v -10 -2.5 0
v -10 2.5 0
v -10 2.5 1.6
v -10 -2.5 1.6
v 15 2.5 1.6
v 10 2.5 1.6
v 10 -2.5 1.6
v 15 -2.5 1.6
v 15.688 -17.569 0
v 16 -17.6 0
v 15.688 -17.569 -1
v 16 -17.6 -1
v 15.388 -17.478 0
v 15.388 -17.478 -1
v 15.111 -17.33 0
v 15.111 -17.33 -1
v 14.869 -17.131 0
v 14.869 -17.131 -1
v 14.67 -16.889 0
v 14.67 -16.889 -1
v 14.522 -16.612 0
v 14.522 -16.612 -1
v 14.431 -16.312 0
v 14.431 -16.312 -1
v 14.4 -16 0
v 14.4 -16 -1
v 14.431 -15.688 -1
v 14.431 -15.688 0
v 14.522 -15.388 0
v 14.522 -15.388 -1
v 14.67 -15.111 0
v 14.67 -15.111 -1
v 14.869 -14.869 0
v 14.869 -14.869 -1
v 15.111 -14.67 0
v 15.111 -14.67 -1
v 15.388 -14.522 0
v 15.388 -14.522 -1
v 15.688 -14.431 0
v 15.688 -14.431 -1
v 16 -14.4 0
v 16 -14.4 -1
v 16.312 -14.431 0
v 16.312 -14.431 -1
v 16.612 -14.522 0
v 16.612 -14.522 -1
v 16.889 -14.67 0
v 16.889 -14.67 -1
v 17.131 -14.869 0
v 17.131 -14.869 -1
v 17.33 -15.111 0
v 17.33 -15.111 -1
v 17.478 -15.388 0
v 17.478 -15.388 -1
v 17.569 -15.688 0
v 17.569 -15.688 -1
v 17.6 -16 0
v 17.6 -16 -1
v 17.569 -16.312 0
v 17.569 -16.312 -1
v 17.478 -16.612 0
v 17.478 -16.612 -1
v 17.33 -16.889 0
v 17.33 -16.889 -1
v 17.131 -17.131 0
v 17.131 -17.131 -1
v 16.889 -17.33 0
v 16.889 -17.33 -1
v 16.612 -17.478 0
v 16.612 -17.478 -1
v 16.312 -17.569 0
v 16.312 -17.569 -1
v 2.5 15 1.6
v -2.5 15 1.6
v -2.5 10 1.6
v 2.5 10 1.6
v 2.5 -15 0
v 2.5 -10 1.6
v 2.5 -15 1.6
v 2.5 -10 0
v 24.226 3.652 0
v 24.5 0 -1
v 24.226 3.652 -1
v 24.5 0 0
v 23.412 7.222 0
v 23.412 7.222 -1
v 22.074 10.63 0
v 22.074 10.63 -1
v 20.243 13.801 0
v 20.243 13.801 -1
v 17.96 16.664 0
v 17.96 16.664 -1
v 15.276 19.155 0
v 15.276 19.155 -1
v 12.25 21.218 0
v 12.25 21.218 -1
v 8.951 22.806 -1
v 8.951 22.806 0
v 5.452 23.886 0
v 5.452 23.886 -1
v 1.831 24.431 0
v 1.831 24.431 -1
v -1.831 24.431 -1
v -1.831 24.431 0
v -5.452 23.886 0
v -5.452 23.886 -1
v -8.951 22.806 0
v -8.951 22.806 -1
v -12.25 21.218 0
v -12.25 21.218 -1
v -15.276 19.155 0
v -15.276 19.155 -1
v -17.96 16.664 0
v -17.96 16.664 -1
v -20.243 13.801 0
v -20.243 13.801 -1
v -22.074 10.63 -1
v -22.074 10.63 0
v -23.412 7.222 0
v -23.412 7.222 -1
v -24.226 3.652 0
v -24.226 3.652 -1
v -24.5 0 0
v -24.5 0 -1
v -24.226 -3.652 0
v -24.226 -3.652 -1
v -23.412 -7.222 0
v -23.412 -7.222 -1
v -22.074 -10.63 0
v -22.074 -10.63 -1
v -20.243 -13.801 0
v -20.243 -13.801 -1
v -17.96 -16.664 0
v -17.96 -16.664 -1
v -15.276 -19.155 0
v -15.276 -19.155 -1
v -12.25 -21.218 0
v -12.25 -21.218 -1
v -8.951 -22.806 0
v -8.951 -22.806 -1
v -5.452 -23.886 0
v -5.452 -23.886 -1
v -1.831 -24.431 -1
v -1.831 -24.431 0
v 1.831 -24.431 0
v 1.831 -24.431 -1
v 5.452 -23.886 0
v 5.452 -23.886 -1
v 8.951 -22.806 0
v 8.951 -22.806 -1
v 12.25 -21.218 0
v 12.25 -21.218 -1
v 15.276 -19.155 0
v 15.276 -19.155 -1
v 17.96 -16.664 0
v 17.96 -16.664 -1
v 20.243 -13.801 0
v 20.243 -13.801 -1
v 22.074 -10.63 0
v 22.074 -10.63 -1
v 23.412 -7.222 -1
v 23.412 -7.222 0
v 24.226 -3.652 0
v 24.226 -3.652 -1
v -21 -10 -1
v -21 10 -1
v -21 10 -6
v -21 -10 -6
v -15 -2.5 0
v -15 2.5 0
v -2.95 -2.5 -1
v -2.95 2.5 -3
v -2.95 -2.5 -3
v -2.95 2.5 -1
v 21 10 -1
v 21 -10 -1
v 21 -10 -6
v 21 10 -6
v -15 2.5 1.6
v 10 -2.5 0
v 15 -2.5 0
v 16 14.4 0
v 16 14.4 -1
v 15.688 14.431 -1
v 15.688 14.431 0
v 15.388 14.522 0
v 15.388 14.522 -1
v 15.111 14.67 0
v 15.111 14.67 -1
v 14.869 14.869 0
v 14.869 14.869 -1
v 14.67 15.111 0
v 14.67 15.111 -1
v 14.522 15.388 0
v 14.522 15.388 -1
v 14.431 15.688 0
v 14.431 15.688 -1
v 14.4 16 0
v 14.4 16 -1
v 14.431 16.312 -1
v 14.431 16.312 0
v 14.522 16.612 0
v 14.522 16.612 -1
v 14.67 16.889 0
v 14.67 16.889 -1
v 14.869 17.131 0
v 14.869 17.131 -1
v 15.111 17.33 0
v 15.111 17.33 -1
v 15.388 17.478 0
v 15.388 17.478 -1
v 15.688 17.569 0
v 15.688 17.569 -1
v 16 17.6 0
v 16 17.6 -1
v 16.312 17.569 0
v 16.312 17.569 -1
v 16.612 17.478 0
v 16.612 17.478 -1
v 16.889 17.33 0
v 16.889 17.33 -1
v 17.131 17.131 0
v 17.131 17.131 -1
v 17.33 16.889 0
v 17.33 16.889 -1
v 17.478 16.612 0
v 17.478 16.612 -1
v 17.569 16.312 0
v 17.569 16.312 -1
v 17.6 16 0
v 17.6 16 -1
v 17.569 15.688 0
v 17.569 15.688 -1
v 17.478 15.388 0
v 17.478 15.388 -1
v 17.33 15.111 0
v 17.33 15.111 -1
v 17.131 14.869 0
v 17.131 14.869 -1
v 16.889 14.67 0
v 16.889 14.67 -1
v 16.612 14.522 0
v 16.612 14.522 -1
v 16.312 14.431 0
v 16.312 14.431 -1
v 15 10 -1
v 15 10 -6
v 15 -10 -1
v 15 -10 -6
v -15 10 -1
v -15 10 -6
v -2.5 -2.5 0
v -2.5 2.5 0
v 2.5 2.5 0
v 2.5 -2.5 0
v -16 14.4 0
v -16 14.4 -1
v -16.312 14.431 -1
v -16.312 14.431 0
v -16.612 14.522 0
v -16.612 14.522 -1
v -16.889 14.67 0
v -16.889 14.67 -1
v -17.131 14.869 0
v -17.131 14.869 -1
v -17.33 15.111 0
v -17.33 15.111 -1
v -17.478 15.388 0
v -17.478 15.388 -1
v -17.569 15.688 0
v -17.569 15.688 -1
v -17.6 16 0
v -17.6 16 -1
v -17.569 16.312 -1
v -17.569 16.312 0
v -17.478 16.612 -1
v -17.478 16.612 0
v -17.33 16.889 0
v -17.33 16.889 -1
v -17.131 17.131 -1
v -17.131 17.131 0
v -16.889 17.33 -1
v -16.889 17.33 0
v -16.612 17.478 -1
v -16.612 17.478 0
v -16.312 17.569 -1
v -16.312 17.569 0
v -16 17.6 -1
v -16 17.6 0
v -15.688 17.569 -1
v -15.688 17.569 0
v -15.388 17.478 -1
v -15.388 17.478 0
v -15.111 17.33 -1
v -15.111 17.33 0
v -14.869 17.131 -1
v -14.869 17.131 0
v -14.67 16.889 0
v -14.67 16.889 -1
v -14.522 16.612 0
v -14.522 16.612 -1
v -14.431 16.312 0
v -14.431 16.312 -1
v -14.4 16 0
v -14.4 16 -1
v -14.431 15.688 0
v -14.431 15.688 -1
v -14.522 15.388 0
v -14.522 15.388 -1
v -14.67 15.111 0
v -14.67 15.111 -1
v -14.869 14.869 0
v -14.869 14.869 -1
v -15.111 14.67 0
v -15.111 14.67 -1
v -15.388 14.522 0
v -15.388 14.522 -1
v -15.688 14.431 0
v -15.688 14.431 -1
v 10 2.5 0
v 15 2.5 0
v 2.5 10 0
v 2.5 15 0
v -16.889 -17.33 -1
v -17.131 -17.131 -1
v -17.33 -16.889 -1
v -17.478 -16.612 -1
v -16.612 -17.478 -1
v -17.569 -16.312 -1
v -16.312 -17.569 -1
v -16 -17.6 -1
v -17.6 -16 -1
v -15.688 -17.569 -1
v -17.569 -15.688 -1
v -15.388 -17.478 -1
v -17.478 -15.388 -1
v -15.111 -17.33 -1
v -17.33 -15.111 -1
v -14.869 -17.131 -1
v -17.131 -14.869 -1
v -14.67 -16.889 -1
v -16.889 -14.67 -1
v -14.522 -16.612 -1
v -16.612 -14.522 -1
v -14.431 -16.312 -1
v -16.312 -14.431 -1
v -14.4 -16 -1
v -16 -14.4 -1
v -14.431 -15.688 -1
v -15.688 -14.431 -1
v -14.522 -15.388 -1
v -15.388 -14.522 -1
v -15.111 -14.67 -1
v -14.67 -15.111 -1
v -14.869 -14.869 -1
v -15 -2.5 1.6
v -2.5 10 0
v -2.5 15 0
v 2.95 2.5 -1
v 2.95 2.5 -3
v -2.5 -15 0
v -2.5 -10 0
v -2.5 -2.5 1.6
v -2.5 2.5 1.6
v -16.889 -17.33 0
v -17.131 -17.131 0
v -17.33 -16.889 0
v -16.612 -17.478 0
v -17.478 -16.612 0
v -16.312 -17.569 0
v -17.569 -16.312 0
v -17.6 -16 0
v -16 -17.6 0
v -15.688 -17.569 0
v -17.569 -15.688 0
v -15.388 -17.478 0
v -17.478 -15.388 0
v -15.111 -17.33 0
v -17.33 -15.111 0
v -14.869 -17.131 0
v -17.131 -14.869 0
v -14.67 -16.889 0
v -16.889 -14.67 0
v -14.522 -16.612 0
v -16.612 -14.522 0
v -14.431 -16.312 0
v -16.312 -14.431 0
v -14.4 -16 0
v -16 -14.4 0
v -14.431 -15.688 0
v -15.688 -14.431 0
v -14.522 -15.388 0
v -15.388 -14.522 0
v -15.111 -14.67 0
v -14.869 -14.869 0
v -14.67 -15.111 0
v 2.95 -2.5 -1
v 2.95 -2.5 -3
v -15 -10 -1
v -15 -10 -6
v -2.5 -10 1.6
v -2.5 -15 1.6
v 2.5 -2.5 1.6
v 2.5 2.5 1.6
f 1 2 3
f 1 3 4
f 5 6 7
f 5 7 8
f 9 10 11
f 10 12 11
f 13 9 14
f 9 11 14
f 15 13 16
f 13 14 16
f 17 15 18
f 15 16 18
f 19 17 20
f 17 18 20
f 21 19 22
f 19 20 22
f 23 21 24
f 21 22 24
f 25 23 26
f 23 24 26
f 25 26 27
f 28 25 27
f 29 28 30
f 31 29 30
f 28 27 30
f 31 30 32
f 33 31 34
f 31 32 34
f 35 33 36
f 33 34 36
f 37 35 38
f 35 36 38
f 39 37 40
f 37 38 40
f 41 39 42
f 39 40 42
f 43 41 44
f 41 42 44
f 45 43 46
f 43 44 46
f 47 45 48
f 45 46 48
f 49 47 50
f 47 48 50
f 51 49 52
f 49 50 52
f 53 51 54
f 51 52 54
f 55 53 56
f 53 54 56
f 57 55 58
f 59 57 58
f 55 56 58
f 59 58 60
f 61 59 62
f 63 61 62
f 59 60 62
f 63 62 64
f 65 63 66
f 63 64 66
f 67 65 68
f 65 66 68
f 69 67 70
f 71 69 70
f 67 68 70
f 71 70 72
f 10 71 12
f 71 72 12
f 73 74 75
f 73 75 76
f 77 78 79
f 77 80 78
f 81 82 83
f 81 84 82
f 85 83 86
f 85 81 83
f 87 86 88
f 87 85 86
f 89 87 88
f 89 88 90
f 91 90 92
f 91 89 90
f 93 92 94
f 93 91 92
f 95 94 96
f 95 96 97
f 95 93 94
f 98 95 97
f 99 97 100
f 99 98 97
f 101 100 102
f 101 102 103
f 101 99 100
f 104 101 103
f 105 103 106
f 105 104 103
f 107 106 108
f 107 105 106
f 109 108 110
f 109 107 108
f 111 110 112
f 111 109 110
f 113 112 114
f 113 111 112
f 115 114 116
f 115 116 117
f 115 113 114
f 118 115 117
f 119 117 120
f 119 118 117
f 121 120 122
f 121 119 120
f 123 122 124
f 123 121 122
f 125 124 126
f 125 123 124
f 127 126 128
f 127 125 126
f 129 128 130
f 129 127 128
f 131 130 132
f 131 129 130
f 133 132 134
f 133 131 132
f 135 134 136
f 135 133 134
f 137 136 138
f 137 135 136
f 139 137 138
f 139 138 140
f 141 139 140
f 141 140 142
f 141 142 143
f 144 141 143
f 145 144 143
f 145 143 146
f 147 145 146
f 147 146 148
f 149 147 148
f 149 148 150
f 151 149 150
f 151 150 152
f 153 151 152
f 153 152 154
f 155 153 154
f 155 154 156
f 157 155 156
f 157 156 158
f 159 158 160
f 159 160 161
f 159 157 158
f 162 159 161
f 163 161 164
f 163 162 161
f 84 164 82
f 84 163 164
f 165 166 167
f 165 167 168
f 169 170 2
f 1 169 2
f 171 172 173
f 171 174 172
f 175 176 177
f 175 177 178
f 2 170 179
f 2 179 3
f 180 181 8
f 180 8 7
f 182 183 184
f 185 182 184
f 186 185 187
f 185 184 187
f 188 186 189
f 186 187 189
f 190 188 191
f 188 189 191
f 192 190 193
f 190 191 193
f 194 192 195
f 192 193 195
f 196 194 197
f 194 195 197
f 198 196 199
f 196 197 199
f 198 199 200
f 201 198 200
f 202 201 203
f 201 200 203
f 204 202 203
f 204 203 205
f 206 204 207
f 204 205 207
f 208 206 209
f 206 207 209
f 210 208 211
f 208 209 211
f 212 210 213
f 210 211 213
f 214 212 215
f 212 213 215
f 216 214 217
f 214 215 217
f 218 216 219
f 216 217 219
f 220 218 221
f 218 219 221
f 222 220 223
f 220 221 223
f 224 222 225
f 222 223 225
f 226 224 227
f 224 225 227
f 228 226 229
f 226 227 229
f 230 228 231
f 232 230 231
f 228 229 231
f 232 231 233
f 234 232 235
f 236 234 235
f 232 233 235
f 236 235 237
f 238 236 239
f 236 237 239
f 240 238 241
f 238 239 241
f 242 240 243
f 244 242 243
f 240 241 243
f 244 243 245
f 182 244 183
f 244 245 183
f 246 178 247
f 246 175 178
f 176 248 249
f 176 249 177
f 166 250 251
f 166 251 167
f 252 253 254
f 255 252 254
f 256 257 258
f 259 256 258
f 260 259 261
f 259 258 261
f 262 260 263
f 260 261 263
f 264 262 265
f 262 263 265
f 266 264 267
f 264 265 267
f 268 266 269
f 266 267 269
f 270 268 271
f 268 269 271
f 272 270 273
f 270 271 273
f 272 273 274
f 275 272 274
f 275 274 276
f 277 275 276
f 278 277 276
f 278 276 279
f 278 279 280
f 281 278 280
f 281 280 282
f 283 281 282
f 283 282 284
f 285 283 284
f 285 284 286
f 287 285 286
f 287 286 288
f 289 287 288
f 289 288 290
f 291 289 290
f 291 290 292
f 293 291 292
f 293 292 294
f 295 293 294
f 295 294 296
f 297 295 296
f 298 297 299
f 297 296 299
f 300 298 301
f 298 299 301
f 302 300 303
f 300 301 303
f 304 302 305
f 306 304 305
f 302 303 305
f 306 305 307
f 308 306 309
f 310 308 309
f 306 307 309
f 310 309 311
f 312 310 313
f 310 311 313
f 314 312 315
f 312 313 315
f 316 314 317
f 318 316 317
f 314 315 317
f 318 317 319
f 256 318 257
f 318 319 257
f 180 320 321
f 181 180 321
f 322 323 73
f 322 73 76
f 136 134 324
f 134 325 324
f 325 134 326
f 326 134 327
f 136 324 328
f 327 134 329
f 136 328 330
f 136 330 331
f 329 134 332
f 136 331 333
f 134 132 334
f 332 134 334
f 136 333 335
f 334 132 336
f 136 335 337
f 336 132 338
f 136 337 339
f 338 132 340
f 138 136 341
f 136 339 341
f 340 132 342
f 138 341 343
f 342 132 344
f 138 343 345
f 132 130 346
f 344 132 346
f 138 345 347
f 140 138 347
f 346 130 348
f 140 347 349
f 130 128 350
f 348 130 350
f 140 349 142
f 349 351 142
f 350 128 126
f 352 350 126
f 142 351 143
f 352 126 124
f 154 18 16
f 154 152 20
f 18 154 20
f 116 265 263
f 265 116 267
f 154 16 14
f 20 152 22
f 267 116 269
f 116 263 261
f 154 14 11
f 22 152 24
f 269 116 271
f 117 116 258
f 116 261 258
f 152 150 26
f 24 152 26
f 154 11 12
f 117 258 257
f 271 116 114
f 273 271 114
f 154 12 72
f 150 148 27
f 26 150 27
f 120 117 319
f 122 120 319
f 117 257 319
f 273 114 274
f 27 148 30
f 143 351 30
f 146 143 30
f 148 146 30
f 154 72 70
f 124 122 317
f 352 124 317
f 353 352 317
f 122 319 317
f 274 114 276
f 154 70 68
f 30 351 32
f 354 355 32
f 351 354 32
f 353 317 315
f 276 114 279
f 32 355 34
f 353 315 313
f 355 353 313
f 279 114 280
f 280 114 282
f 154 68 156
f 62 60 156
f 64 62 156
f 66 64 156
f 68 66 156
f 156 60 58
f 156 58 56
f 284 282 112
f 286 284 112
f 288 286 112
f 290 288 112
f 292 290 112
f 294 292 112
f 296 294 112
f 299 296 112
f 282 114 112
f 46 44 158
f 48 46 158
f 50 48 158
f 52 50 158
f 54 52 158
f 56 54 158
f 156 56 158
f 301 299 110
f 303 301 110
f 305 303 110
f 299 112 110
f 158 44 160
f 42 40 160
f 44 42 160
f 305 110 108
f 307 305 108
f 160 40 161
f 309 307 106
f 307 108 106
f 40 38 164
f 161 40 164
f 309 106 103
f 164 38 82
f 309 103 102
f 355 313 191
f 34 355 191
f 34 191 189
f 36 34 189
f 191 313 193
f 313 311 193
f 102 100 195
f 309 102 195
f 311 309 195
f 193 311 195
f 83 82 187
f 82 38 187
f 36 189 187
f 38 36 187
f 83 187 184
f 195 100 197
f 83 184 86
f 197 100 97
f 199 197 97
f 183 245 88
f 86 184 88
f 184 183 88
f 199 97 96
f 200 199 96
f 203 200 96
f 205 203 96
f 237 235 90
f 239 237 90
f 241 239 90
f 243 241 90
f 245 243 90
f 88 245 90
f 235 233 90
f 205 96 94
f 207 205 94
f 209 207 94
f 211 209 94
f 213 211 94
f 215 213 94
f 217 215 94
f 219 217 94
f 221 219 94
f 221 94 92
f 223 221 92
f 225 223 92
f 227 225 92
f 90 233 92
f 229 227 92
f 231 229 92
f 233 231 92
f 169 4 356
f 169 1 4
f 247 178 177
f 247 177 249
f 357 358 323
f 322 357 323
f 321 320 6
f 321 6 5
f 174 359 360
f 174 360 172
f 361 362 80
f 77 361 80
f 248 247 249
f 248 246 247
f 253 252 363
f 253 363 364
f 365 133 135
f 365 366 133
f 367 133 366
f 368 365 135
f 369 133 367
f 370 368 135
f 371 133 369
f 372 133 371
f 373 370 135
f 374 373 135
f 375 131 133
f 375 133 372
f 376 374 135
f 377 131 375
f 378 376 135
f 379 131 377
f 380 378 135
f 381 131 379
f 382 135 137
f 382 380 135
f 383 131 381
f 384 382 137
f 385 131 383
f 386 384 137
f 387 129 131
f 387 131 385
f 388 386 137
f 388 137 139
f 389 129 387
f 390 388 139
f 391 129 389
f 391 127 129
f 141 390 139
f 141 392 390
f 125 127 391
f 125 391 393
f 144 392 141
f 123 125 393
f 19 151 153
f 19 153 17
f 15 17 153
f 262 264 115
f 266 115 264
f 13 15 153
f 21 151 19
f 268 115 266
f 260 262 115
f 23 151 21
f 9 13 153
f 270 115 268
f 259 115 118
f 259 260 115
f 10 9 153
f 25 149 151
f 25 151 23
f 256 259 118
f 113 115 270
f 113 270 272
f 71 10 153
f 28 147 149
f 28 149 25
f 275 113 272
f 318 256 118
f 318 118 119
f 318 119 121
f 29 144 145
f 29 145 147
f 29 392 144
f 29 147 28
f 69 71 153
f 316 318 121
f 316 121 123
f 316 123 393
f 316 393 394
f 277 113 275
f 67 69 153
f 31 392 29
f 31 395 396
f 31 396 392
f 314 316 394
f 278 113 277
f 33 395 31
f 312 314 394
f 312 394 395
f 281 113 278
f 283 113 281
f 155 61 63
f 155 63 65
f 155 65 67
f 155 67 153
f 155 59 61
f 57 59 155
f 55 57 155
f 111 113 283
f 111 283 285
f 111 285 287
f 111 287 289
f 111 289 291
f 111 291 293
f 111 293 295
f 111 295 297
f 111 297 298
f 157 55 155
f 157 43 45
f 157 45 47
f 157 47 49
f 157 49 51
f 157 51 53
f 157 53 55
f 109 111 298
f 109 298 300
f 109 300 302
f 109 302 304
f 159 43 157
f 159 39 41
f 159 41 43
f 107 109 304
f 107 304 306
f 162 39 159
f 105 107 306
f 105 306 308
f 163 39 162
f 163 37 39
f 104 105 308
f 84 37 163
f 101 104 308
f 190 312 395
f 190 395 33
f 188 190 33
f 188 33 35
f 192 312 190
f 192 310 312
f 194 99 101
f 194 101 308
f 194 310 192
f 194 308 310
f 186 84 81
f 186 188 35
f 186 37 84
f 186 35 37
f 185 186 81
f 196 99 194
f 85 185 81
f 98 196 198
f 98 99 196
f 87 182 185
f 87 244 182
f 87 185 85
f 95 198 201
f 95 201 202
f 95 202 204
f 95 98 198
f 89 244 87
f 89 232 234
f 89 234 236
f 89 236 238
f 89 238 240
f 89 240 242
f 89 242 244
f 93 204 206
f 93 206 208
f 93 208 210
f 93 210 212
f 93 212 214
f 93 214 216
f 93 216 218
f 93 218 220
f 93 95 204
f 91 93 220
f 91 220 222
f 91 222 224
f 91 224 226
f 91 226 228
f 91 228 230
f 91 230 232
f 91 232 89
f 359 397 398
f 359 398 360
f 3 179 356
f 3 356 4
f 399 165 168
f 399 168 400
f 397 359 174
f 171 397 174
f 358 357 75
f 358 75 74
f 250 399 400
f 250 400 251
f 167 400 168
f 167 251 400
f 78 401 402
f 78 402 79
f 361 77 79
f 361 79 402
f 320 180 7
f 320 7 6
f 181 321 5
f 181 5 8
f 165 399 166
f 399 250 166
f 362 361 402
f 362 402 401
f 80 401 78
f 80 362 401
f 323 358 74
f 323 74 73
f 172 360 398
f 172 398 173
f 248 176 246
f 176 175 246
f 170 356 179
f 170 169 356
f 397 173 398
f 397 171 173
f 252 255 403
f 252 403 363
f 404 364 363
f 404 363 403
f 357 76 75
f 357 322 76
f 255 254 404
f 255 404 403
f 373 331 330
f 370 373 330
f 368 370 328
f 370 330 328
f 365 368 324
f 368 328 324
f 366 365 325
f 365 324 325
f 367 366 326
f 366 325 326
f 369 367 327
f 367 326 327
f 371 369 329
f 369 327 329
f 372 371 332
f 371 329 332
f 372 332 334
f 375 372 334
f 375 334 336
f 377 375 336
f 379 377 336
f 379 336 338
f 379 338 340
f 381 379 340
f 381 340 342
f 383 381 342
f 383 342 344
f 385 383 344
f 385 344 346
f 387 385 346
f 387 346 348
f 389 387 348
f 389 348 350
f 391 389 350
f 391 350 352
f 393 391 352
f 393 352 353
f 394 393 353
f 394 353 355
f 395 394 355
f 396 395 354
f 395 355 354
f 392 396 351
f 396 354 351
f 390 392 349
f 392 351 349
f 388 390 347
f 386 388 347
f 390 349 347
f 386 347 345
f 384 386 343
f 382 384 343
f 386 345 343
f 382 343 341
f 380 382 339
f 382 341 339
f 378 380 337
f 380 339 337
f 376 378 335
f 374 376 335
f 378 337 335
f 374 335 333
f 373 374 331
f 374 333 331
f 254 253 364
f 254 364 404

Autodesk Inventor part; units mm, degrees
ref_plane "YZ Plane" through (0, 0, 0) normal (1, 0, 0) x (0, 1, 0)
ref_plane "XZ Plane" through (0, 0, 0) normal (0, 1, 0) x (-1, 0, 0)
ref_plane "XY Plane" through (0, 0, 0) normal (0, 0, 1) x (1, 0, 0)
sketch "Skizze1" plane through (0, 0, 0) normal (0, 0, 1) x (1, 0, 0)
  circle A0 centre (0, 0) radius 25
  circle A1 centre (0, 0) radius 24.5
  circle A2 centre (0, 0) radius 22.6274 construction
  line L0 (-16, 16) -> (16, 16) construction
  line L1 (16, 16) -> (16, -16) construction
  line L2 (16, -16) -> (-16, -16) construction
  line L3 (-16, -16) -> (-16, 16) construction
  point P0 (16, 16)
  dimension "d0" = 50
  dimension "d1" = 0.5
  dimension "d2" = 32
extrude "Extrusion1" add sketch "Skizze1" against normal blind 1 contours A1
hole "Bohrung1" at (-16, 16, 0) at (16, 16, 0) at (16, -16, 0) at (-16, -16, 0) direction (0, 0, -1) diameter 3.2 end through all
sketch "Skizze2" plane through (0, 0, 0) normal (0, 0, 1) x (1, 0, 0)
  circle A0 centre (16, -16) radius 1.6 projected
  circle A1 centre (-16, 16) radius 1.6 projected
  circle A2 centre (16, 16) radius 1.6 projected
  circle A3 centre (-16, -16) radius 1.6 projected
  circle A4 centre (0, 0) radius 24.5 projected
  line L0 (-25.6213, 25.3721) -> (25.184, 25.3721) construction
  line L1 (25.184, 25.3721) -> (25.184, -25.4332) construction
  line L2 (25.184, -25.4332) -> (-25.6213, -25.4332) construction
  line L3 (-25.6213, -25.4332) -> (-25.6213, 25.3721) construction
sketch "Skizze3" plane through (0, 0, 0) normal (0, 0, 1) x (1, 0, 0)
  circle A0 centre (0, 0) radius 24.5 projected
  line L0 (-2.5, 2.5) -> (2.5, 2.5)
  line L1 (2.5, 2.5) -> (2.5, -2.5)
  line L2 (2.5, -2.5) -> (-2.5, -2.5)
  line L3 (-2.5, -2.5) -> (-2.5, 2.5)
  line L4 (-15, 2.5) -> (-10, 2.5)
  line L5 (-10, 2.5) -> (-10, -2.5)
  line L6 (-10, -2.5) -> (-15, -2.5)
  line L7 (-15, -2.5) -> (-15, 2.5)
  line L8 (-15, 2.5) -> (-10, -2.5) construction
  line L9 (-2.5, 2.5) -> (2.5, -2.5) construction
  line L10 (2.5, -2.5) -> (0, 0) construction
  line L11 (0, 0) -> (-12.5, 0) construction
  line L12 (-2.5, -15) -> (-2.5, -10)
  line L13 (-2.5, -10) -> (2.5, -10)
  line L14 (2.5, -10) -> (2.5, -15)
  line L15 (2.5, -15) -> (-2.5, -15)
  line L16 (15, -2.5) -> (10, -2.5)
  line L17 (10, -2.5) -> (10, 2.5)
  line L18 (10, 2.5) -> (15, 2.5)
  line L19 (15, 2.5) -> (15, -2.5)
  line L20 (2.5, 15) -> (2.5, 10)
  line L21 (2.5, 10) -> (-2.5, 10)
  line L22 (-2.5, 10) -> (-2.5, 15)
  line L23 (-2.5, 15) -> (2.5, 15)
  dimension "d24" = 5
  dimension "d25" = 12.5
  dimension "d28" = 360
extrude "Extrusion2" add sketch "Skizze3" along normal blind 1.6 separate body contours L0 L1 L2 L3 | L4 L5 L6 L7 | L12 L13 L14 L15 | L16 L17 L18 L19 | L20 L21 L22 L23
sketch "Skizze4" plane through (0, 0, -1) normal (0, 0, -1) x (-1, 0, 0)
  circle A0 centre (0, 0) radius 24.5 projected
  line L0 (-2.95, 2.5) -> (2.95, 2.5)
  line L1 (2.95, 2.5) -> (2.95, -2.5)
  line L2 (2.95, -2.5) -> (-2.95, -2.5)
  line L3 (-2.95, -2.5) -> (-2.95, 2.5)
  line L4 (-2.95, -2.5) -> (2.95, 2.5) construction
  dimension "d33" = 5.9
  dimension "d34" = 5
extrude "Extrusion3" add sketch "Skizze4" along normal blind 2 separate body contours L0 L1 L2 L3
sketch "Skizze5" plane through (0, 0, -1) normal (0, 0, -1) x (-1, 0, 0)
  circle A0 centre (0, 0) radius 24.5 projected
  line L0 (-21, 10) -> (-15, 10)
  line L1 (-15, 10) -> (-15, -10)
  line L2 (-15, -10) -> (-21, -10)
  line L3 (-21, -10) -> (-21, 10)
  line L4 (15, 10) -> (21, 10)
  line L5 (21, 10) -> (21, -10)
  line L6 (21, -10) -> (15, -10)
  line L7 (15, -10) -> (15, 10)
  line L8 (-21, 0) -> (21, 0) construction
  line L9 (-18, 10) -> (-18, -10) construction
  point P0 (0, 0)
  dimension "d38" = 20
  dimension "d39" = 6
  dimension "d40" = 18
extrude "Extrusion4" add sketch "Skizze5" along normal blind 5 contours L0 L1 L2 L3 | L4 L5 L6 L7 bodies 3
sketch "Skizze6" plane through (0, 0, -1) normal (0, 0, -1) x (-1, 0, 0)
  line L0 (-26.2075, 26.1914) -> (26.4628, 26.1914) construction
  line L1 (26.4628, 26.1914) -> (26.4628, -26.479) construction
  line L2 (26.4628, -26.479) -> (-26.2075, -26.479) construction
  line L3 (-26.2075, -26.479) -> (-26.2075, 26.1914) construction
properties part number "Encoder with LEDs"
